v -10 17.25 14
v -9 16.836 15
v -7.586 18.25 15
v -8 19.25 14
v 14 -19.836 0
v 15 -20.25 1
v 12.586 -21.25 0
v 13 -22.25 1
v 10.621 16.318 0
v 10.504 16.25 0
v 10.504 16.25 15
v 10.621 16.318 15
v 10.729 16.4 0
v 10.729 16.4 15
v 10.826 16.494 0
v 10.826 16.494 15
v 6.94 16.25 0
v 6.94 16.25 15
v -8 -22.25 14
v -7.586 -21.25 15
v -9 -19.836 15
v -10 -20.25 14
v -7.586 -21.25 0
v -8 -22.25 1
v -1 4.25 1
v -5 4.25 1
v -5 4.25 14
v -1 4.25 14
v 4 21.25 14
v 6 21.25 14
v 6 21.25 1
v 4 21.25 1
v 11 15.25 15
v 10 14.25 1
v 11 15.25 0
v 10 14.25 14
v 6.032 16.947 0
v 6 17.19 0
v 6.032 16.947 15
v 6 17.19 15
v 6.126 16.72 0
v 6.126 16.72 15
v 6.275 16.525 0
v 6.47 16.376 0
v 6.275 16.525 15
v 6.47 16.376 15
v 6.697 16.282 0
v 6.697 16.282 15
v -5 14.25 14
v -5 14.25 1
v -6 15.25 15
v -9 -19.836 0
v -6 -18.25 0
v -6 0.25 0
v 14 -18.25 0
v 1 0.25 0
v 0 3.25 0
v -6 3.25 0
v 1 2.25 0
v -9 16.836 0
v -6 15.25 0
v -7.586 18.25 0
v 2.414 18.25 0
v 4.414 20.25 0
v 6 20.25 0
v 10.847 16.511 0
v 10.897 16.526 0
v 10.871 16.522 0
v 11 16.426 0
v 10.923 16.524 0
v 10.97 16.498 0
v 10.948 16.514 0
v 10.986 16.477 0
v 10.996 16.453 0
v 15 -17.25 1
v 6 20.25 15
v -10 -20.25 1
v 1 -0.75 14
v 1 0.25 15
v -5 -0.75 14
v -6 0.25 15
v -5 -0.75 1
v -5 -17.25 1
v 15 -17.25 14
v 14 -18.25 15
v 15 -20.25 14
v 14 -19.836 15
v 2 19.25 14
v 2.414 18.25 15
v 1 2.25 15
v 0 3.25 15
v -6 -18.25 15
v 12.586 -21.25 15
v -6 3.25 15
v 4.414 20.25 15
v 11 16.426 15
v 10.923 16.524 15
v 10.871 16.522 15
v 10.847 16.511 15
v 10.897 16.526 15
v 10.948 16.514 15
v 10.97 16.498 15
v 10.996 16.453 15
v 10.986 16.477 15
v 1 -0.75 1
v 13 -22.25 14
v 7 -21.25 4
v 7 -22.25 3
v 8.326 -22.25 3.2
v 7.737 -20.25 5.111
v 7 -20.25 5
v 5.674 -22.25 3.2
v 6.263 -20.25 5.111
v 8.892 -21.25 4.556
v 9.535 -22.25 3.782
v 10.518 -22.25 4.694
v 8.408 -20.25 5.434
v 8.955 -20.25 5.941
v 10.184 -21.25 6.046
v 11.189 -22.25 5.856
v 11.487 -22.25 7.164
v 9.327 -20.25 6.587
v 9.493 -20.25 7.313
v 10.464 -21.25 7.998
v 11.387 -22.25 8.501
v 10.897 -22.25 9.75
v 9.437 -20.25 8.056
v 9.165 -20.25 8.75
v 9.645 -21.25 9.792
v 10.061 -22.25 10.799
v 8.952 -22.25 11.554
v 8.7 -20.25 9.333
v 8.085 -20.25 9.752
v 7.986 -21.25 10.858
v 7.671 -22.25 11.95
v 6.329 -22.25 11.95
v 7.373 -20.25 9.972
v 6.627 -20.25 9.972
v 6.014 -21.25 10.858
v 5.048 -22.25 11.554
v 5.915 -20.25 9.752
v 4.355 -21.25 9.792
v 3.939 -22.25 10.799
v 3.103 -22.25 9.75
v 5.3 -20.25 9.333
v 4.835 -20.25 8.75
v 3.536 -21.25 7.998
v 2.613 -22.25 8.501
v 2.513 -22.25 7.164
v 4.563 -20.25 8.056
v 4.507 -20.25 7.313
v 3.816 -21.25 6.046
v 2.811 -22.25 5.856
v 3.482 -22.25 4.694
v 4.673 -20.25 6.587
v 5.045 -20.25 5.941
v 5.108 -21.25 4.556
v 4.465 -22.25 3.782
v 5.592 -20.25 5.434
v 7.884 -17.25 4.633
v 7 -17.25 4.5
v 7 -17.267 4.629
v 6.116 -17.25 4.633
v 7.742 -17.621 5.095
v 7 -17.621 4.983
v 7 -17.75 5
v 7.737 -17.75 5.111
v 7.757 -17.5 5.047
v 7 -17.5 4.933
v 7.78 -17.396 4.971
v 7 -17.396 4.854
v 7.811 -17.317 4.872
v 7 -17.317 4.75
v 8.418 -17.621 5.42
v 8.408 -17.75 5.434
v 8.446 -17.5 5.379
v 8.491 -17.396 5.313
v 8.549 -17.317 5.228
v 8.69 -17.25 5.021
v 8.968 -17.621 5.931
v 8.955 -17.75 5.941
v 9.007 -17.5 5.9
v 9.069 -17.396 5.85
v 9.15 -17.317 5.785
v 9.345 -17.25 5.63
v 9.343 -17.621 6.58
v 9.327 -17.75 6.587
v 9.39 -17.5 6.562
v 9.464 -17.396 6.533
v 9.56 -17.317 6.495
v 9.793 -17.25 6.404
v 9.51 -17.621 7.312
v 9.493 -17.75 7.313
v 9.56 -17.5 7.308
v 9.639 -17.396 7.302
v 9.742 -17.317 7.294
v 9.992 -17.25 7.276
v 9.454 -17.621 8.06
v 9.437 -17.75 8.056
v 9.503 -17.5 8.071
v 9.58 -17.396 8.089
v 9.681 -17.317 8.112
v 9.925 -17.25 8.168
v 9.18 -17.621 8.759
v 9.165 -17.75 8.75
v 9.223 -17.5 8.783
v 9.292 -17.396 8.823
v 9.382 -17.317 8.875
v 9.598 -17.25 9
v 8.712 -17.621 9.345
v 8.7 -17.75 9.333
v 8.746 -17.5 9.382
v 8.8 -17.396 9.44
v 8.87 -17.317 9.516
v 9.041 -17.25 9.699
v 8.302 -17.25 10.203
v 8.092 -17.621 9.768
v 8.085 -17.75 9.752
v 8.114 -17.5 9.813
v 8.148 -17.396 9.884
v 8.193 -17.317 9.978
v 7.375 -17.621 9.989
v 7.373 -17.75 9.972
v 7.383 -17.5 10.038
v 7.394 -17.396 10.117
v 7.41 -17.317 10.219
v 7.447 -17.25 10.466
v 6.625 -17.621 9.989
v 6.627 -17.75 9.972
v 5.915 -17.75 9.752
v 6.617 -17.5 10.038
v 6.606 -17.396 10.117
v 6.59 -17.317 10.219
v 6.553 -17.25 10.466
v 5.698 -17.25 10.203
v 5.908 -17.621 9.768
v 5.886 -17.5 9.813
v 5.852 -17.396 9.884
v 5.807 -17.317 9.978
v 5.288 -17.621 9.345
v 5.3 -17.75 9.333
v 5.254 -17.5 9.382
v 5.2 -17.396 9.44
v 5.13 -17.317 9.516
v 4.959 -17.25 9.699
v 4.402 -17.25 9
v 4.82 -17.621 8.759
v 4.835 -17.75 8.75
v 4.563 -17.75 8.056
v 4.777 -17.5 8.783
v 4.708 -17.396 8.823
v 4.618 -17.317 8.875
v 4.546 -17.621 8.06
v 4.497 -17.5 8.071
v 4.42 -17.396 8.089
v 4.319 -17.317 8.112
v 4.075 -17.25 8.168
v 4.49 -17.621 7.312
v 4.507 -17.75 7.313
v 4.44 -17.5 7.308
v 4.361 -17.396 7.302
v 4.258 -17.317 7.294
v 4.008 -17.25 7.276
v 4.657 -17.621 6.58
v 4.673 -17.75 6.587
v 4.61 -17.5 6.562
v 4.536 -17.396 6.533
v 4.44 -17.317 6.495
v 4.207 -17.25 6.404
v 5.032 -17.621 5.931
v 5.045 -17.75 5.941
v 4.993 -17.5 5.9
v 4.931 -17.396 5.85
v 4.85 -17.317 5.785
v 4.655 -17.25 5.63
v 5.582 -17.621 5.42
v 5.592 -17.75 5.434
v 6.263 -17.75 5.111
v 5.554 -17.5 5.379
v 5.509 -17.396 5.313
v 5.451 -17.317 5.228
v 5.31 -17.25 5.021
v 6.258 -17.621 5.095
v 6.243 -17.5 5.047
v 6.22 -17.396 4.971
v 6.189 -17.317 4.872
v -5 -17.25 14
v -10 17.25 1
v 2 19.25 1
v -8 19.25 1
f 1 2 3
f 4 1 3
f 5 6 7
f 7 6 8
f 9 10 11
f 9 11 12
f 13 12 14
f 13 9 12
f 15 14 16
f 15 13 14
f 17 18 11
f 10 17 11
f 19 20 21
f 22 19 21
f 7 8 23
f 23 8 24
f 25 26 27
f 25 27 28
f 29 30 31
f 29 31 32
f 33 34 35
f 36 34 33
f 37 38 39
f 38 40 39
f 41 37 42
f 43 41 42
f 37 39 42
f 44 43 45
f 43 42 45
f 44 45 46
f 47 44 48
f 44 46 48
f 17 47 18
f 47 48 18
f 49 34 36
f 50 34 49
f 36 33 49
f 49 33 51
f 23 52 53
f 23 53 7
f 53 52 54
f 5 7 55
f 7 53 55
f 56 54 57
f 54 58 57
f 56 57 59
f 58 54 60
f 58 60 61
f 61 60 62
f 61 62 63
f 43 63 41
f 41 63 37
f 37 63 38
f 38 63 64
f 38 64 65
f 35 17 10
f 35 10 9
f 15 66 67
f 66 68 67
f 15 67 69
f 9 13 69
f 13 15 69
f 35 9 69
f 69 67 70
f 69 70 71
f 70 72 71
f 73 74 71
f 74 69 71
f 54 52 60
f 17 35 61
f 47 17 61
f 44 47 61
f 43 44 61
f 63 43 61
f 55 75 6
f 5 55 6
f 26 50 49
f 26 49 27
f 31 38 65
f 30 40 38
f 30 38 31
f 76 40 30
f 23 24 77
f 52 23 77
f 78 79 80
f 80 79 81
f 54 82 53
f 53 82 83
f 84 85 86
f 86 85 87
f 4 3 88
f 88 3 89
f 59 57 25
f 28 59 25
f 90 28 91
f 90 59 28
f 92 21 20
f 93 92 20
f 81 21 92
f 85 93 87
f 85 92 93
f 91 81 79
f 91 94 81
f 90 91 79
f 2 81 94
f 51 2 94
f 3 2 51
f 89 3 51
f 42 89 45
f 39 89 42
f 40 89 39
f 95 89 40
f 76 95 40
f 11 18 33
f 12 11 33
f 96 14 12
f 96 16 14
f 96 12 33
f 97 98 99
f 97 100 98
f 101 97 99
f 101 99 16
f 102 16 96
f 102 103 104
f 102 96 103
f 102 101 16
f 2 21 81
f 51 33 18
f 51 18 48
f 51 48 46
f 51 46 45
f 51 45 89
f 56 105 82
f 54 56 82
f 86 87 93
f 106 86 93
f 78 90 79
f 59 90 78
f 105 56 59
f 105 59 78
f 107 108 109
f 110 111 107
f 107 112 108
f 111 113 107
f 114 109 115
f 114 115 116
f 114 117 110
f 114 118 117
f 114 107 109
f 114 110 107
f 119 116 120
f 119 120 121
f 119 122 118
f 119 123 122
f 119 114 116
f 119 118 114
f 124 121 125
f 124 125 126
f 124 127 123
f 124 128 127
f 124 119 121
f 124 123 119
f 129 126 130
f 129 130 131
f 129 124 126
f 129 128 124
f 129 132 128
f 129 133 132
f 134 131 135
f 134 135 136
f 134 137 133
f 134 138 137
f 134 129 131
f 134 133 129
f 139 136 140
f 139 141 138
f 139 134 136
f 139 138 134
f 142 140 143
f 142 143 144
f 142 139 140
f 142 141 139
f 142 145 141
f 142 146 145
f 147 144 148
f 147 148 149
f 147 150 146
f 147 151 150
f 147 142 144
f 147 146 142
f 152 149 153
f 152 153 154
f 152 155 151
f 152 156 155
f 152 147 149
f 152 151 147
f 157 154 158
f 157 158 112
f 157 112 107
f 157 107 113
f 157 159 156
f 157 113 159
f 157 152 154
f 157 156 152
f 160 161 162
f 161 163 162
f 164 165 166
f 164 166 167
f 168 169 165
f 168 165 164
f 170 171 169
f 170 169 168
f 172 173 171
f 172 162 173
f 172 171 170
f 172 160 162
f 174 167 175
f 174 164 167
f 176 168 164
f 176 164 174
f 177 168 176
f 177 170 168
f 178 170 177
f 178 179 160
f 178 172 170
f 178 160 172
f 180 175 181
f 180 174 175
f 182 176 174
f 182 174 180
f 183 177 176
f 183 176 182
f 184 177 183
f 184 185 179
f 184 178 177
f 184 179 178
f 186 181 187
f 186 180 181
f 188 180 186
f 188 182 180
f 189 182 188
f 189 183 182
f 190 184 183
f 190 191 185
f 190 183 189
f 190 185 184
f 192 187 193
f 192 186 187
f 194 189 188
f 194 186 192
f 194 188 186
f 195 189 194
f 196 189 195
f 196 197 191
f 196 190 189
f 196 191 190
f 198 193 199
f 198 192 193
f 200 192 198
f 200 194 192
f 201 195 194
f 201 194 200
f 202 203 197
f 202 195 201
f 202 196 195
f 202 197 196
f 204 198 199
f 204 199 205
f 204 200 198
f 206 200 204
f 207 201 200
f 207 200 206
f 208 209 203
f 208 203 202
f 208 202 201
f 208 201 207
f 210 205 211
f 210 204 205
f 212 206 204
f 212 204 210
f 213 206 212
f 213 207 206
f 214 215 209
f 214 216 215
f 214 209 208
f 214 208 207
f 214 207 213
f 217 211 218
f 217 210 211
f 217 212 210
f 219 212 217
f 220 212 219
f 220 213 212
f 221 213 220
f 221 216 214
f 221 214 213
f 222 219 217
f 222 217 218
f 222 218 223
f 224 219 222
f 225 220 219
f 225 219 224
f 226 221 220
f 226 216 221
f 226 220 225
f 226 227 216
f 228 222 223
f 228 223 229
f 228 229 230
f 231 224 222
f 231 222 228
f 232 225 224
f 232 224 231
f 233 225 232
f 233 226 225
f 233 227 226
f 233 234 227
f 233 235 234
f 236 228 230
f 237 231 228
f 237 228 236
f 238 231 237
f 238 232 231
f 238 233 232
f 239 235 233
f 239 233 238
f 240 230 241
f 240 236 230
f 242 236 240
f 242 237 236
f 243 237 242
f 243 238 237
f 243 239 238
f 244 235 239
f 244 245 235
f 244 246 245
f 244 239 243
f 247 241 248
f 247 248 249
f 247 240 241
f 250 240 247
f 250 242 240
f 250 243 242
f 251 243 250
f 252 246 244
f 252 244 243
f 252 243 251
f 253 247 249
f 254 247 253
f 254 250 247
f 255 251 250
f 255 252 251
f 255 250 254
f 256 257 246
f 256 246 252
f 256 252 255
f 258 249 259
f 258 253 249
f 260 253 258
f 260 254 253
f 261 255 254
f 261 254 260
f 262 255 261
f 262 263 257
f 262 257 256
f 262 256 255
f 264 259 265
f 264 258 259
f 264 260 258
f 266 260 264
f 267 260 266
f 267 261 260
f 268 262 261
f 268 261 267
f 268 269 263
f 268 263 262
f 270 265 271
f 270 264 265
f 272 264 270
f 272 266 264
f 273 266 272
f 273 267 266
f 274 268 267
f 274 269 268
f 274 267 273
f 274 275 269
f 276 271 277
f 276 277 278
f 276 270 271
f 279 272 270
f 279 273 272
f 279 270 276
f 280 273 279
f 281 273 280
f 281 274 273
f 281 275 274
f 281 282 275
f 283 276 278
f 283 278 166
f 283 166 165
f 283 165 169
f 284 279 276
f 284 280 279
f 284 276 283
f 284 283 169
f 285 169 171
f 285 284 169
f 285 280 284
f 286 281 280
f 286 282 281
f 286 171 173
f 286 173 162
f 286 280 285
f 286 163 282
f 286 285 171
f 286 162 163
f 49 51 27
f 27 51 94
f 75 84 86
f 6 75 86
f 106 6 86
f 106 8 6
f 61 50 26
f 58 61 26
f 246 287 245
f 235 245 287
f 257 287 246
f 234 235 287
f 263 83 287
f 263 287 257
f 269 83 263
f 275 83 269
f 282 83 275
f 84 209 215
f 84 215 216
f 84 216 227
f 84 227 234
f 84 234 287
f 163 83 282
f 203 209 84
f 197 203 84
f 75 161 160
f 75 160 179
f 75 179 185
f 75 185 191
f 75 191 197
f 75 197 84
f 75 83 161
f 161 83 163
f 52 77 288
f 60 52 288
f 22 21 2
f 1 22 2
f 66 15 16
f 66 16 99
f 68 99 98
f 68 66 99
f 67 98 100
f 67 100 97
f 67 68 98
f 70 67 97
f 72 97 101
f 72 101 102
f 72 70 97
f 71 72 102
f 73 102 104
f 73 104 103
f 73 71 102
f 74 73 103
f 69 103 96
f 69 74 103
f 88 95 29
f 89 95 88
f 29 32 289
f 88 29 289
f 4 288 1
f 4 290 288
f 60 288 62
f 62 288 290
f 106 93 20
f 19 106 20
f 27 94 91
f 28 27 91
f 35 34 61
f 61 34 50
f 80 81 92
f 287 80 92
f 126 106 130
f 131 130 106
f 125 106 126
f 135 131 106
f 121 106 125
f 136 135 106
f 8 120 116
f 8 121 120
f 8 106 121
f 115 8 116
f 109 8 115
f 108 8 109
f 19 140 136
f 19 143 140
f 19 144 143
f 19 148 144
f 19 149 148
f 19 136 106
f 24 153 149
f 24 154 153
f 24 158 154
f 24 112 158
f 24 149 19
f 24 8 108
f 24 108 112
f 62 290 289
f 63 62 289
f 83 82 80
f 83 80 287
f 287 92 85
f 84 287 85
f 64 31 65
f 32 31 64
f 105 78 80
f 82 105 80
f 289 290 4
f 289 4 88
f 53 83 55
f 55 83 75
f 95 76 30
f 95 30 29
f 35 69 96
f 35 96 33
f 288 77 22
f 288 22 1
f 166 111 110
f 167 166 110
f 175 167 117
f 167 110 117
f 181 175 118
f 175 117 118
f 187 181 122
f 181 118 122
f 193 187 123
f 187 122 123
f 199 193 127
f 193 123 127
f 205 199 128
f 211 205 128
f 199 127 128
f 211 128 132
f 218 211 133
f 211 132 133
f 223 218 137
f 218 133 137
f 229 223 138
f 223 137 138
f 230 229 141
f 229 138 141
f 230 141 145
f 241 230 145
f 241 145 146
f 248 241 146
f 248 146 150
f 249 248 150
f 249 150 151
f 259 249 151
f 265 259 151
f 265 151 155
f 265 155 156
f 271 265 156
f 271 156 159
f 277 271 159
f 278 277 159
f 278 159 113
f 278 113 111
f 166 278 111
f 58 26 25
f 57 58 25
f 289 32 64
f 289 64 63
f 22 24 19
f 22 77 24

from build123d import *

# Parameters (mm, degrees)
RESSALTO_EXTRUS_O1_DEPTH = 15
ESBO_O3_R                = 2.5
CORTE_EXTRUS_O1_DEPTH    = 15
CHANFRO1_SIZE            = 2
FILETE1_R                = 0.5
FILETE2_R                = 0.94
RESSALTO_EXTRUS_O3_DEPTH = 15
CHANFRO5_SIZE            = 2
CHANFRO4_SIZE            = 1


with BuildPart() as part:
    # Esboço1 → Ressalto-extrusão1 (new body)
    with BuildSketch(Plane.XY):
        with BuildLine():
            Line((11, 14.25), (-5, 14.25))
            Line((-5, 14.25), (-5, 4.25))
            Line((-5, 4.25), (1, 4.25))
            Line((1, 4.25), (1, -0.75))
            Line((1, -0.75), (-5, -0.75))
            Line((-5, -0.75), (-5, -17.25))
            Line((-5, -17.25), (15, -17.25))
            Line((15, -17.25), (15, -22.25))
            Line((15, -22.25), (-10, -22.25))
            Line((-10, -22.25), (-10, 19.25))
            Line((-10, 19.25), (6, 19.25))
            Line((6, 19.25), (6, 16.25))
            Line((6, 16.25), (10.504380809, 16.25))
            ThreePointArc((10.504380809, 16.25), (10.676386068, 16.357306387), (10.826229508, 16.493861918))
            ThreePointArc((10.826229508, 16.493861918), (10.936214298, 16.519561844), (11, 16.426349589))
            Line((11, 16.426349589), (11, 16.25))
            Line((11, 16.25), (11, 14.25))
        make_face()
    extrude(amount=RESSALTO_EXTRUS_O1_DEPTH)

    # Esboço3 → Corte-extrusão1 (cut)
    with BuildSketch(Plane.XZ.offset(22.25)):
        with Locations(Location((7, 7.5, 0), (0, 0, 270))):
            Circle(ESBO_O3_R)
    extrude(amount=-CORTE_EXTRUS_O1_DEPTH, mode=Mode.SUBTRACT)

    # Chanfro1
    chanfro1_edges = [part.edges().sort_by_distance(p)[0] for p in [
        (7, -22.25, 10),
    ]]
    chamfer(chanfro1_edges, length=CHANFRO1_SIZE)

    # Filete1
    filete1_edges = [part.edges().sort_by_distance(p)[0] for p in [
        (7, -17.25, 10),
    ]]
    fillet(filete1_edges, radius=FILETE1_R)

    # Filete2
    filete2_edges = [part.edges().sort_by_distance(p)[0] for p in [
        (6, 16.25, 7.5),
    ]]
    fillet(filete2_edges, radius=FILETE2_R)

    # Esboço5 → Ressalto-extrusão3 (add)
    with BuildSketch(Plane.XY.offset(15)):
        Polygon((6, 19.25), (6, 21.25), (4, 21.25), (2, 19.25), align=None)
    extrude(amount=-RESSALTO_EXTRUS_O3_DEPTH)

    # Chanfro5
    chanfro5_edges = [part.edges().sort_by_distance(p)[0] for p in [
        (15, -22.25, 7.5),
        (-10, -22.25, 7.5),
        (-10, 19.25, 7.5),
        (1, 4.25, 7.5),
    ]]
    chamfer(chanfro5_edges, length=CHANFRO5_SIZE)

    # Chanfro4
    chanfro4_edges = [part.edges().sort_by_distance(p)[0] for p in [
        (-5, 9.25, 15),
        (-2, -0.75, 0),
        (3, 14.25, 15),
        (-5, -9, 0),
        (5, -17.25, 0),
        (3, 14.25, 0),
        (-5, 9.25, 0),
        (11, 14.25, 7.5),
        (5, -17.25, 15),
        (-5, -9, 15),
        (-2, -0.75, 15),
        (-3, 19.25, 0),
        (-3, 19.25, 15),
        (5, 21.25, 15),
        (3, 20.25, 15),
        (3, 20.25, 0),
        (5, 21.25, 0),
        (-3, 4.25, 0),
        (-3, 4.25, 15),
        (15, -18.75, 0),
        (2.5, -22.25, 0),
        (-10, -1.5, 0),
        (-9, 18.25, 0),
        (-9, -21.25, 0),
        (14, -21.25, 0),
        (-10, -1.5, 15),
        (2.5, -22.25, 15),
        (15, -18.75, 15),
        (-9, 18.25, 15),
        (-9, -21.25, 15),
        (14, -21.25, 15),
    ]]
    chamfer(chanfro4_edges, length=CHANFRO4_SIZE)


solid = part.part
